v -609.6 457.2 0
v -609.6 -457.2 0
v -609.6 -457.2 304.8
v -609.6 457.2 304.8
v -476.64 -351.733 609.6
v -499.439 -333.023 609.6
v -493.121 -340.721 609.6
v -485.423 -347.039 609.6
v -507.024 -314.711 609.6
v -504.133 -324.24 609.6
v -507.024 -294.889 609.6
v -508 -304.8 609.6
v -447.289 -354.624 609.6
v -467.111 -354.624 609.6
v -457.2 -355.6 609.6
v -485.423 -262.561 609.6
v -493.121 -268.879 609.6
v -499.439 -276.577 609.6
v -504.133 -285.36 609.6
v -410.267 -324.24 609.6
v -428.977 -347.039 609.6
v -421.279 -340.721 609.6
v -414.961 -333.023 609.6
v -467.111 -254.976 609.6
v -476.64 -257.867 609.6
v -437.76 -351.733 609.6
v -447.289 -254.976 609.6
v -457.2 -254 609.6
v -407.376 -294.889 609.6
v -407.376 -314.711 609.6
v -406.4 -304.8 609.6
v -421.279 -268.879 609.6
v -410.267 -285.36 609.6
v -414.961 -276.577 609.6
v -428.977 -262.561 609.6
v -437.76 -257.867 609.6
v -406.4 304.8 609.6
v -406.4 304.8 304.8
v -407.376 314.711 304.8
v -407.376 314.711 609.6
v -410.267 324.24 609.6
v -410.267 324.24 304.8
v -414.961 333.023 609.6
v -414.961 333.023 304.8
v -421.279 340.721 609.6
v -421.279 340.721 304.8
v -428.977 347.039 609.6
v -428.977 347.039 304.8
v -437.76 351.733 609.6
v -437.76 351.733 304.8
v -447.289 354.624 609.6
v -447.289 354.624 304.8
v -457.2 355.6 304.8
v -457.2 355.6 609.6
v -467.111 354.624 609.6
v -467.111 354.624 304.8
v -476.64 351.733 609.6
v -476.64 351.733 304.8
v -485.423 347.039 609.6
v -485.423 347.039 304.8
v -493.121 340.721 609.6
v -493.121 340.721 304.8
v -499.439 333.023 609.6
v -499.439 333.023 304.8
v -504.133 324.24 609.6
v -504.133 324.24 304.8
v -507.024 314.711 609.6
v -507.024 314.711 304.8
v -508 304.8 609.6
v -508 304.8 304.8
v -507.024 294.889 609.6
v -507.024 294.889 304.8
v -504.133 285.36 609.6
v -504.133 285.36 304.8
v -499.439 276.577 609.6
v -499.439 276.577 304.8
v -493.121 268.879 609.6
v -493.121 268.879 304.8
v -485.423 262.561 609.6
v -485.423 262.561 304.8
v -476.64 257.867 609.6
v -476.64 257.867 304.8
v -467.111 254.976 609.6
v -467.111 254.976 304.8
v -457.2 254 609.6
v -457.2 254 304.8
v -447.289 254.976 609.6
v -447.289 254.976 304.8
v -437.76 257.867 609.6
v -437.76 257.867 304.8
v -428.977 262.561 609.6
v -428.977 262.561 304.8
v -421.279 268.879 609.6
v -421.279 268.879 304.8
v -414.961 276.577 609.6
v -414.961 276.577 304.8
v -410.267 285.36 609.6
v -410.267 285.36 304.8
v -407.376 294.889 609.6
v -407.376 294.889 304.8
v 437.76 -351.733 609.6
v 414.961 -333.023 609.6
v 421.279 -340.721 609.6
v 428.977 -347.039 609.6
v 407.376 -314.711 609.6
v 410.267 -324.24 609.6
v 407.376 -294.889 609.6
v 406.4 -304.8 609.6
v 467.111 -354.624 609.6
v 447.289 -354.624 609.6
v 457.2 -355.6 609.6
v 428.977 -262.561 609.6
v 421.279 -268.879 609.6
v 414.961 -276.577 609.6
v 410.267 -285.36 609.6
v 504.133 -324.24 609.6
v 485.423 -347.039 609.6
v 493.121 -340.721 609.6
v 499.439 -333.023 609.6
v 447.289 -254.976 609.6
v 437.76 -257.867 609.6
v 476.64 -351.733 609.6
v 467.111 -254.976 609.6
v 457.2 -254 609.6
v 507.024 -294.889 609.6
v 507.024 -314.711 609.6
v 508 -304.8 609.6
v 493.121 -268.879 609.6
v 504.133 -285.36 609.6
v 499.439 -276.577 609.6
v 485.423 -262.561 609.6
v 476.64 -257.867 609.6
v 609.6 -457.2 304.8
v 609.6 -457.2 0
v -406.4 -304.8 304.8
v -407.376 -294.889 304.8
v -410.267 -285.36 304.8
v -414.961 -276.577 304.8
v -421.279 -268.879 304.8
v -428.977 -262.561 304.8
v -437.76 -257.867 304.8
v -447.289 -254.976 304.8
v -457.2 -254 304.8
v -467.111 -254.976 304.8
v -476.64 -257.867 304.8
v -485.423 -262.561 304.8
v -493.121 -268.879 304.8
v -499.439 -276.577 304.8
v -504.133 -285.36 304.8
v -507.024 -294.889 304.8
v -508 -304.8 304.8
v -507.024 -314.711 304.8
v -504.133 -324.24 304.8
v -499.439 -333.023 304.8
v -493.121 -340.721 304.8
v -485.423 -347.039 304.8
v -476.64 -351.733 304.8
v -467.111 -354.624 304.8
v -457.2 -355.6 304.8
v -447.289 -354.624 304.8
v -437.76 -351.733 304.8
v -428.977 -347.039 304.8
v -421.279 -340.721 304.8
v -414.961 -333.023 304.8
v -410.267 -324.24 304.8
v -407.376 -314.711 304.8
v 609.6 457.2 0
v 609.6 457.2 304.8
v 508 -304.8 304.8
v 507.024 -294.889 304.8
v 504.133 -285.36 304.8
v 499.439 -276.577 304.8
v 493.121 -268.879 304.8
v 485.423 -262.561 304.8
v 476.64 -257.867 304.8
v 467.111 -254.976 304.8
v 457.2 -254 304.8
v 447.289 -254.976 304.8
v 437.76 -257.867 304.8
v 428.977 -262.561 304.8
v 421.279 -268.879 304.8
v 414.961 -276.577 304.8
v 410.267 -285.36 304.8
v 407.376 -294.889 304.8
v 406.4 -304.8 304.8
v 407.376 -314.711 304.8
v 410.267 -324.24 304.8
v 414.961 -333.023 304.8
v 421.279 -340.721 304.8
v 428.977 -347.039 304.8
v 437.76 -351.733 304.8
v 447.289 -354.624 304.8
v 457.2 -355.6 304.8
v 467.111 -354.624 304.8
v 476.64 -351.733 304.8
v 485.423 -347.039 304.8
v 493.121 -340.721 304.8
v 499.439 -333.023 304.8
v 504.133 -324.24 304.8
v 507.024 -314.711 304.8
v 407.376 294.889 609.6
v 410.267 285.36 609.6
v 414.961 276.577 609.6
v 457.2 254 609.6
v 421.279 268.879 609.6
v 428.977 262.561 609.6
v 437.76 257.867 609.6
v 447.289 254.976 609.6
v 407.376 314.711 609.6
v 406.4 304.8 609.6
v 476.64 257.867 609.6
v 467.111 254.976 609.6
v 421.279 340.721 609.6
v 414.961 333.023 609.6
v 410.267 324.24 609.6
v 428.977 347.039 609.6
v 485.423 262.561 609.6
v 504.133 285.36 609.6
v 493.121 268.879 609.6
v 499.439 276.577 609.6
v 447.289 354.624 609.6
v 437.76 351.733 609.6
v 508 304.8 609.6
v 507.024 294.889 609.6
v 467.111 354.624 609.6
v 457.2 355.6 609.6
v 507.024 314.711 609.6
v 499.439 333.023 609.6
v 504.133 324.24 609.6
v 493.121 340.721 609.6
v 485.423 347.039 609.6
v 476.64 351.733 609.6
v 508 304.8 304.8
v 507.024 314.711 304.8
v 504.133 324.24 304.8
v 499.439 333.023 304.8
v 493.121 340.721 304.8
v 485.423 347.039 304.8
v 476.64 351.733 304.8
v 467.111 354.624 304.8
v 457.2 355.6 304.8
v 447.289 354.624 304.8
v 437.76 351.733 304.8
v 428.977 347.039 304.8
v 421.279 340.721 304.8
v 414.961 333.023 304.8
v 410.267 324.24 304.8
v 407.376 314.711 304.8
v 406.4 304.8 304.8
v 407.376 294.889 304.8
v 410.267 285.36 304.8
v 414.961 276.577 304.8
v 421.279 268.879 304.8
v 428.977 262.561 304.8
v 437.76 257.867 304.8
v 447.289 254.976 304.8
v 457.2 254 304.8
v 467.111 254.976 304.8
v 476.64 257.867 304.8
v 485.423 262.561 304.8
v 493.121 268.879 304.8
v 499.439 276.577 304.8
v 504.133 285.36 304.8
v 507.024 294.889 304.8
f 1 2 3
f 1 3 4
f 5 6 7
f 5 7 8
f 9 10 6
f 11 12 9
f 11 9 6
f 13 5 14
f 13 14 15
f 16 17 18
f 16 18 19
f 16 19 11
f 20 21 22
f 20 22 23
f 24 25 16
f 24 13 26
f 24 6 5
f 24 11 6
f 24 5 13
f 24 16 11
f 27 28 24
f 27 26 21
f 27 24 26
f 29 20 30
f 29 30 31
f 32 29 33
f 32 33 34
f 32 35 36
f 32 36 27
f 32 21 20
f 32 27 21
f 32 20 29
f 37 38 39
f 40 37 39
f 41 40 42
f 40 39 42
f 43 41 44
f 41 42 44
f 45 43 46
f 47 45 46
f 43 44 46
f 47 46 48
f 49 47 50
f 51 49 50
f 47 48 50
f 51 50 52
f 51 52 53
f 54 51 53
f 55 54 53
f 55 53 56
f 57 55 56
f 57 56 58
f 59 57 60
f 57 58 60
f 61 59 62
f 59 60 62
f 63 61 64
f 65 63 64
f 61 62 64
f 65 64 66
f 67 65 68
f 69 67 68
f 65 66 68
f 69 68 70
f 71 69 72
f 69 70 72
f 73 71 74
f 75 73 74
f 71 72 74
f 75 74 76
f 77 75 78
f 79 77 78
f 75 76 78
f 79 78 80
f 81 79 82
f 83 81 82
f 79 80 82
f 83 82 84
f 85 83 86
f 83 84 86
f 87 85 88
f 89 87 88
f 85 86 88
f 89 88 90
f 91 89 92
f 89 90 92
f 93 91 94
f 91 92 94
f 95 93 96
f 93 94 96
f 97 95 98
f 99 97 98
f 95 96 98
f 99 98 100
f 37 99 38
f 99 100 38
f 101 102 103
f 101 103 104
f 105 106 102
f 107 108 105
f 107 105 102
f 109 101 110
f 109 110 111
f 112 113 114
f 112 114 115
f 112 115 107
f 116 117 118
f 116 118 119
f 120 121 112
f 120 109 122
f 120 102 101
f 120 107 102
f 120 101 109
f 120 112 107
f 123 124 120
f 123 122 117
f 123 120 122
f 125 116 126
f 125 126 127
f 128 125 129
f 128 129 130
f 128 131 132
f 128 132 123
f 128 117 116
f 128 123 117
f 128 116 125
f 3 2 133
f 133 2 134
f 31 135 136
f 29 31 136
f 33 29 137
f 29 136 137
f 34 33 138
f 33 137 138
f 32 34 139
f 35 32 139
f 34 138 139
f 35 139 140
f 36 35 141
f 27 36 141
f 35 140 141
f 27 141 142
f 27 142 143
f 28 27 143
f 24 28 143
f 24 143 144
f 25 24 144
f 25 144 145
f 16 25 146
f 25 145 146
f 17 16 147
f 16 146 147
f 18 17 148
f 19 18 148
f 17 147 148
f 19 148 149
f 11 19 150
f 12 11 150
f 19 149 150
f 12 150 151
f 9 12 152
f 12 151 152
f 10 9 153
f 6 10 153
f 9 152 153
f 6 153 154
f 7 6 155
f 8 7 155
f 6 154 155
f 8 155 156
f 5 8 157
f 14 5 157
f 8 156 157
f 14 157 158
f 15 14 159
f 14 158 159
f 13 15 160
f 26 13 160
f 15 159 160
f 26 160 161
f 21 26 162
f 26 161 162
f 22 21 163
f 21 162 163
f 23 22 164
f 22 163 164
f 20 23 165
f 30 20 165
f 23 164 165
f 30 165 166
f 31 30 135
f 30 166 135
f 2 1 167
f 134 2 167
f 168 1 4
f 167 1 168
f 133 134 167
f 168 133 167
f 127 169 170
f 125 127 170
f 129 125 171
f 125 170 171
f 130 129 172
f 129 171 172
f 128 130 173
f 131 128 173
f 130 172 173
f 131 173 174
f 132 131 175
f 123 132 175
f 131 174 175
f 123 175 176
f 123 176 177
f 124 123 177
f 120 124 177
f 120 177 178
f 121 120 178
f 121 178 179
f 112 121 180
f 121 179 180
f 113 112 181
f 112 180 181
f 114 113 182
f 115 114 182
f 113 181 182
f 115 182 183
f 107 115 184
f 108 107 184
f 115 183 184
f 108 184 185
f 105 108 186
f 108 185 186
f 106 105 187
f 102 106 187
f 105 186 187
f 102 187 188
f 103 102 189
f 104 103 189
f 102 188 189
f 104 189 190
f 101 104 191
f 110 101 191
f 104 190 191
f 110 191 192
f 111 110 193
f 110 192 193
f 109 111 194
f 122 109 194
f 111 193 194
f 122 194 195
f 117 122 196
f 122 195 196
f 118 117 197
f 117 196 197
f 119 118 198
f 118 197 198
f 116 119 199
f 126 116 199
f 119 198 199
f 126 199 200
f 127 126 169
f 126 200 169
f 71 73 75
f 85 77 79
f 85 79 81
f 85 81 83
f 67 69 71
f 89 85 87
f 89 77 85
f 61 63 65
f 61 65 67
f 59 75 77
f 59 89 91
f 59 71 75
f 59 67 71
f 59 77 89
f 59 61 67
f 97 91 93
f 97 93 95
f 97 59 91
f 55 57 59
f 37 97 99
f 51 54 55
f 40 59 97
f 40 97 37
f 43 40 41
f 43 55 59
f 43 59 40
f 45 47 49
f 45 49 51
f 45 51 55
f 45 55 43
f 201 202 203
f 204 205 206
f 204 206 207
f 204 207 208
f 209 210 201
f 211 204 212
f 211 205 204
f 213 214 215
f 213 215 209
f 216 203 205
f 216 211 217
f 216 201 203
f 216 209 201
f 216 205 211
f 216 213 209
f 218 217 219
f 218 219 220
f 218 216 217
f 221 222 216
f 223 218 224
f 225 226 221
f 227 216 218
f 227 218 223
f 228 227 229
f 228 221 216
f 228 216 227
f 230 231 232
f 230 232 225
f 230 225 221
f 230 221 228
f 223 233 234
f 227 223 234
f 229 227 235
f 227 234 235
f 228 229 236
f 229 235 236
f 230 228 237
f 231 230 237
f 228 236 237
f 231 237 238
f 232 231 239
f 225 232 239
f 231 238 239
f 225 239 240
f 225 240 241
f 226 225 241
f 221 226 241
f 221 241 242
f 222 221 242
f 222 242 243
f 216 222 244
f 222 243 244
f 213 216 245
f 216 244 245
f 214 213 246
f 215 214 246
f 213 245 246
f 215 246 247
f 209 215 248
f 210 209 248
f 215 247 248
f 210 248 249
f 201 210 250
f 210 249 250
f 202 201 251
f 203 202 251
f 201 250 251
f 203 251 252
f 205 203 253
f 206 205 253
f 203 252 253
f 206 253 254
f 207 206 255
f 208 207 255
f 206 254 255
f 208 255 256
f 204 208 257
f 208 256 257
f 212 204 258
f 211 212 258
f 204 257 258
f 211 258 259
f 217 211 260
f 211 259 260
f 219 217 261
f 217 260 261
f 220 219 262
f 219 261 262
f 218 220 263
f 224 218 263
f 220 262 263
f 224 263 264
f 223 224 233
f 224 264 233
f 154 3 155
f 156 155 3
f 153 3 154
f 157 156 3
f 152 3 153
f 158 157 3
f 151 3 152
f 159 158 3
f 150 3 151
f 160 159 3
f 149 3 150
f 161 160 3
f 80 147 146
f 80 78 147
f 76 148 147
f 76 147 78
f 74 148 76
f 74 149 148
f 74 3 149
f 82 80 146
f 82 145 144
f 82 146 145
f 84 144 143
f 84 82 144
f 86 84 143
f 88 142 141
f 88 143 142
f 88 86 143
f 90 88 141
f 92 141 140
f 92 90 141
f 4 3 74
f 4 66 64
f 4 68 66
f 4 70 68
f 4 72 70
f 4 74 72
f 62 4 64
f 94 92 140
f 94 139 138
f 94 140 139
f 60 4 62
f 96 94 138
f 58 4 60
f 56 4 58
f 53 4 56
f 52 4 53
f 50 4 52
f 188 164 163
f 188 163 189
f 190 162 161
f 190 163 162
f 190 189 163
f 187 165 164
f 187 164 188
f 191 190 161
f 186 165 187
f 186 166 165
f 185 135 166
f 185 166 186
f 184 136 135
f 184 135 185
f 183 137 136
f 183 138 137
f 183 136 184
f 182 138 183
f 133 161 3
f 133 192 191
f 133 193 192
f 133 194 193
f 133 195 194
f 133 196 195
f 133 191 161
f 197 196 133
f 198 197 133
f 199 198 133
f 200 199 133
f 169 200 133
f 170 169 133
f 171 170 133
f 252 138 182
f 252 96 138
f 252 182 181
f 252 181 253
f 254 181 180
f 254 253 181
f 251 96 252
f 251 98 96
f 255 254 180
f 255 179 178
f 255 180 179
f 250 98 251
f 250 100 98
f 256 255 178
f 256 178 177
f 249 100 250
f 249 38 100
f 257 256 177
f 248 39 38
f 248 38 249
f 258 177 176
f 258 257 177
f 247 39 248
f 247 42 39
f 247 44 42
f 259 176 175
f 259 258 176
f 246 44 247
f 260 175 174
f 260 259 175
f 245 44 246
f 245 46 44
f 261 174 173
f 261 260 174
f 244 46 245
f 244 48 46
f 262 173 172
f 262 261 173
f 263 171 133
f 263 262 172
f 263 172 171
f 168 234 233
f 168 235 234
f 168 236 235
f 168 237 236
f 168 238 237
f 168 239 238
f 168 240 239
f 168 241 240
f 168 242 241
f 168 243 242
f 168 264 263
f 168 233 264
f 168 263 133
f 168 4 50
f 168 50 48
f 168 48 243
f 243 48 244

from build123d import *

# Parameters (mm, degrees)
F0_W     = 1219.2
F0_H     = 914.4
F1_DEPTH = 304.8
F2_R     = 50.8
F3_DEPTH = 304.8


with BuildPart() as f1:
    # F0 (on Top) → F1 (new body)
    with BuildSketch(Plane.XY):
        Rectangle(F0_W, F0_H)
    extrude(amount=F1_DEPTH)

    # F2 (on face) → F3 (join)
    with BuildSketch(Plane.XY.offset(304.8)):
        with Locations((-457.2, 304.8)):
            Circle(F2_R)
        with Locations((457.2, 304.8)):
            Circle(F2_R)
        with Locations((457.2, -304.8)):
            Circle(F2_R)
        with Locations((-457.2, -304.8)):
            Circle(F2_R)
    extrude(amount=F3_DEPTH)


solid = f1.part
